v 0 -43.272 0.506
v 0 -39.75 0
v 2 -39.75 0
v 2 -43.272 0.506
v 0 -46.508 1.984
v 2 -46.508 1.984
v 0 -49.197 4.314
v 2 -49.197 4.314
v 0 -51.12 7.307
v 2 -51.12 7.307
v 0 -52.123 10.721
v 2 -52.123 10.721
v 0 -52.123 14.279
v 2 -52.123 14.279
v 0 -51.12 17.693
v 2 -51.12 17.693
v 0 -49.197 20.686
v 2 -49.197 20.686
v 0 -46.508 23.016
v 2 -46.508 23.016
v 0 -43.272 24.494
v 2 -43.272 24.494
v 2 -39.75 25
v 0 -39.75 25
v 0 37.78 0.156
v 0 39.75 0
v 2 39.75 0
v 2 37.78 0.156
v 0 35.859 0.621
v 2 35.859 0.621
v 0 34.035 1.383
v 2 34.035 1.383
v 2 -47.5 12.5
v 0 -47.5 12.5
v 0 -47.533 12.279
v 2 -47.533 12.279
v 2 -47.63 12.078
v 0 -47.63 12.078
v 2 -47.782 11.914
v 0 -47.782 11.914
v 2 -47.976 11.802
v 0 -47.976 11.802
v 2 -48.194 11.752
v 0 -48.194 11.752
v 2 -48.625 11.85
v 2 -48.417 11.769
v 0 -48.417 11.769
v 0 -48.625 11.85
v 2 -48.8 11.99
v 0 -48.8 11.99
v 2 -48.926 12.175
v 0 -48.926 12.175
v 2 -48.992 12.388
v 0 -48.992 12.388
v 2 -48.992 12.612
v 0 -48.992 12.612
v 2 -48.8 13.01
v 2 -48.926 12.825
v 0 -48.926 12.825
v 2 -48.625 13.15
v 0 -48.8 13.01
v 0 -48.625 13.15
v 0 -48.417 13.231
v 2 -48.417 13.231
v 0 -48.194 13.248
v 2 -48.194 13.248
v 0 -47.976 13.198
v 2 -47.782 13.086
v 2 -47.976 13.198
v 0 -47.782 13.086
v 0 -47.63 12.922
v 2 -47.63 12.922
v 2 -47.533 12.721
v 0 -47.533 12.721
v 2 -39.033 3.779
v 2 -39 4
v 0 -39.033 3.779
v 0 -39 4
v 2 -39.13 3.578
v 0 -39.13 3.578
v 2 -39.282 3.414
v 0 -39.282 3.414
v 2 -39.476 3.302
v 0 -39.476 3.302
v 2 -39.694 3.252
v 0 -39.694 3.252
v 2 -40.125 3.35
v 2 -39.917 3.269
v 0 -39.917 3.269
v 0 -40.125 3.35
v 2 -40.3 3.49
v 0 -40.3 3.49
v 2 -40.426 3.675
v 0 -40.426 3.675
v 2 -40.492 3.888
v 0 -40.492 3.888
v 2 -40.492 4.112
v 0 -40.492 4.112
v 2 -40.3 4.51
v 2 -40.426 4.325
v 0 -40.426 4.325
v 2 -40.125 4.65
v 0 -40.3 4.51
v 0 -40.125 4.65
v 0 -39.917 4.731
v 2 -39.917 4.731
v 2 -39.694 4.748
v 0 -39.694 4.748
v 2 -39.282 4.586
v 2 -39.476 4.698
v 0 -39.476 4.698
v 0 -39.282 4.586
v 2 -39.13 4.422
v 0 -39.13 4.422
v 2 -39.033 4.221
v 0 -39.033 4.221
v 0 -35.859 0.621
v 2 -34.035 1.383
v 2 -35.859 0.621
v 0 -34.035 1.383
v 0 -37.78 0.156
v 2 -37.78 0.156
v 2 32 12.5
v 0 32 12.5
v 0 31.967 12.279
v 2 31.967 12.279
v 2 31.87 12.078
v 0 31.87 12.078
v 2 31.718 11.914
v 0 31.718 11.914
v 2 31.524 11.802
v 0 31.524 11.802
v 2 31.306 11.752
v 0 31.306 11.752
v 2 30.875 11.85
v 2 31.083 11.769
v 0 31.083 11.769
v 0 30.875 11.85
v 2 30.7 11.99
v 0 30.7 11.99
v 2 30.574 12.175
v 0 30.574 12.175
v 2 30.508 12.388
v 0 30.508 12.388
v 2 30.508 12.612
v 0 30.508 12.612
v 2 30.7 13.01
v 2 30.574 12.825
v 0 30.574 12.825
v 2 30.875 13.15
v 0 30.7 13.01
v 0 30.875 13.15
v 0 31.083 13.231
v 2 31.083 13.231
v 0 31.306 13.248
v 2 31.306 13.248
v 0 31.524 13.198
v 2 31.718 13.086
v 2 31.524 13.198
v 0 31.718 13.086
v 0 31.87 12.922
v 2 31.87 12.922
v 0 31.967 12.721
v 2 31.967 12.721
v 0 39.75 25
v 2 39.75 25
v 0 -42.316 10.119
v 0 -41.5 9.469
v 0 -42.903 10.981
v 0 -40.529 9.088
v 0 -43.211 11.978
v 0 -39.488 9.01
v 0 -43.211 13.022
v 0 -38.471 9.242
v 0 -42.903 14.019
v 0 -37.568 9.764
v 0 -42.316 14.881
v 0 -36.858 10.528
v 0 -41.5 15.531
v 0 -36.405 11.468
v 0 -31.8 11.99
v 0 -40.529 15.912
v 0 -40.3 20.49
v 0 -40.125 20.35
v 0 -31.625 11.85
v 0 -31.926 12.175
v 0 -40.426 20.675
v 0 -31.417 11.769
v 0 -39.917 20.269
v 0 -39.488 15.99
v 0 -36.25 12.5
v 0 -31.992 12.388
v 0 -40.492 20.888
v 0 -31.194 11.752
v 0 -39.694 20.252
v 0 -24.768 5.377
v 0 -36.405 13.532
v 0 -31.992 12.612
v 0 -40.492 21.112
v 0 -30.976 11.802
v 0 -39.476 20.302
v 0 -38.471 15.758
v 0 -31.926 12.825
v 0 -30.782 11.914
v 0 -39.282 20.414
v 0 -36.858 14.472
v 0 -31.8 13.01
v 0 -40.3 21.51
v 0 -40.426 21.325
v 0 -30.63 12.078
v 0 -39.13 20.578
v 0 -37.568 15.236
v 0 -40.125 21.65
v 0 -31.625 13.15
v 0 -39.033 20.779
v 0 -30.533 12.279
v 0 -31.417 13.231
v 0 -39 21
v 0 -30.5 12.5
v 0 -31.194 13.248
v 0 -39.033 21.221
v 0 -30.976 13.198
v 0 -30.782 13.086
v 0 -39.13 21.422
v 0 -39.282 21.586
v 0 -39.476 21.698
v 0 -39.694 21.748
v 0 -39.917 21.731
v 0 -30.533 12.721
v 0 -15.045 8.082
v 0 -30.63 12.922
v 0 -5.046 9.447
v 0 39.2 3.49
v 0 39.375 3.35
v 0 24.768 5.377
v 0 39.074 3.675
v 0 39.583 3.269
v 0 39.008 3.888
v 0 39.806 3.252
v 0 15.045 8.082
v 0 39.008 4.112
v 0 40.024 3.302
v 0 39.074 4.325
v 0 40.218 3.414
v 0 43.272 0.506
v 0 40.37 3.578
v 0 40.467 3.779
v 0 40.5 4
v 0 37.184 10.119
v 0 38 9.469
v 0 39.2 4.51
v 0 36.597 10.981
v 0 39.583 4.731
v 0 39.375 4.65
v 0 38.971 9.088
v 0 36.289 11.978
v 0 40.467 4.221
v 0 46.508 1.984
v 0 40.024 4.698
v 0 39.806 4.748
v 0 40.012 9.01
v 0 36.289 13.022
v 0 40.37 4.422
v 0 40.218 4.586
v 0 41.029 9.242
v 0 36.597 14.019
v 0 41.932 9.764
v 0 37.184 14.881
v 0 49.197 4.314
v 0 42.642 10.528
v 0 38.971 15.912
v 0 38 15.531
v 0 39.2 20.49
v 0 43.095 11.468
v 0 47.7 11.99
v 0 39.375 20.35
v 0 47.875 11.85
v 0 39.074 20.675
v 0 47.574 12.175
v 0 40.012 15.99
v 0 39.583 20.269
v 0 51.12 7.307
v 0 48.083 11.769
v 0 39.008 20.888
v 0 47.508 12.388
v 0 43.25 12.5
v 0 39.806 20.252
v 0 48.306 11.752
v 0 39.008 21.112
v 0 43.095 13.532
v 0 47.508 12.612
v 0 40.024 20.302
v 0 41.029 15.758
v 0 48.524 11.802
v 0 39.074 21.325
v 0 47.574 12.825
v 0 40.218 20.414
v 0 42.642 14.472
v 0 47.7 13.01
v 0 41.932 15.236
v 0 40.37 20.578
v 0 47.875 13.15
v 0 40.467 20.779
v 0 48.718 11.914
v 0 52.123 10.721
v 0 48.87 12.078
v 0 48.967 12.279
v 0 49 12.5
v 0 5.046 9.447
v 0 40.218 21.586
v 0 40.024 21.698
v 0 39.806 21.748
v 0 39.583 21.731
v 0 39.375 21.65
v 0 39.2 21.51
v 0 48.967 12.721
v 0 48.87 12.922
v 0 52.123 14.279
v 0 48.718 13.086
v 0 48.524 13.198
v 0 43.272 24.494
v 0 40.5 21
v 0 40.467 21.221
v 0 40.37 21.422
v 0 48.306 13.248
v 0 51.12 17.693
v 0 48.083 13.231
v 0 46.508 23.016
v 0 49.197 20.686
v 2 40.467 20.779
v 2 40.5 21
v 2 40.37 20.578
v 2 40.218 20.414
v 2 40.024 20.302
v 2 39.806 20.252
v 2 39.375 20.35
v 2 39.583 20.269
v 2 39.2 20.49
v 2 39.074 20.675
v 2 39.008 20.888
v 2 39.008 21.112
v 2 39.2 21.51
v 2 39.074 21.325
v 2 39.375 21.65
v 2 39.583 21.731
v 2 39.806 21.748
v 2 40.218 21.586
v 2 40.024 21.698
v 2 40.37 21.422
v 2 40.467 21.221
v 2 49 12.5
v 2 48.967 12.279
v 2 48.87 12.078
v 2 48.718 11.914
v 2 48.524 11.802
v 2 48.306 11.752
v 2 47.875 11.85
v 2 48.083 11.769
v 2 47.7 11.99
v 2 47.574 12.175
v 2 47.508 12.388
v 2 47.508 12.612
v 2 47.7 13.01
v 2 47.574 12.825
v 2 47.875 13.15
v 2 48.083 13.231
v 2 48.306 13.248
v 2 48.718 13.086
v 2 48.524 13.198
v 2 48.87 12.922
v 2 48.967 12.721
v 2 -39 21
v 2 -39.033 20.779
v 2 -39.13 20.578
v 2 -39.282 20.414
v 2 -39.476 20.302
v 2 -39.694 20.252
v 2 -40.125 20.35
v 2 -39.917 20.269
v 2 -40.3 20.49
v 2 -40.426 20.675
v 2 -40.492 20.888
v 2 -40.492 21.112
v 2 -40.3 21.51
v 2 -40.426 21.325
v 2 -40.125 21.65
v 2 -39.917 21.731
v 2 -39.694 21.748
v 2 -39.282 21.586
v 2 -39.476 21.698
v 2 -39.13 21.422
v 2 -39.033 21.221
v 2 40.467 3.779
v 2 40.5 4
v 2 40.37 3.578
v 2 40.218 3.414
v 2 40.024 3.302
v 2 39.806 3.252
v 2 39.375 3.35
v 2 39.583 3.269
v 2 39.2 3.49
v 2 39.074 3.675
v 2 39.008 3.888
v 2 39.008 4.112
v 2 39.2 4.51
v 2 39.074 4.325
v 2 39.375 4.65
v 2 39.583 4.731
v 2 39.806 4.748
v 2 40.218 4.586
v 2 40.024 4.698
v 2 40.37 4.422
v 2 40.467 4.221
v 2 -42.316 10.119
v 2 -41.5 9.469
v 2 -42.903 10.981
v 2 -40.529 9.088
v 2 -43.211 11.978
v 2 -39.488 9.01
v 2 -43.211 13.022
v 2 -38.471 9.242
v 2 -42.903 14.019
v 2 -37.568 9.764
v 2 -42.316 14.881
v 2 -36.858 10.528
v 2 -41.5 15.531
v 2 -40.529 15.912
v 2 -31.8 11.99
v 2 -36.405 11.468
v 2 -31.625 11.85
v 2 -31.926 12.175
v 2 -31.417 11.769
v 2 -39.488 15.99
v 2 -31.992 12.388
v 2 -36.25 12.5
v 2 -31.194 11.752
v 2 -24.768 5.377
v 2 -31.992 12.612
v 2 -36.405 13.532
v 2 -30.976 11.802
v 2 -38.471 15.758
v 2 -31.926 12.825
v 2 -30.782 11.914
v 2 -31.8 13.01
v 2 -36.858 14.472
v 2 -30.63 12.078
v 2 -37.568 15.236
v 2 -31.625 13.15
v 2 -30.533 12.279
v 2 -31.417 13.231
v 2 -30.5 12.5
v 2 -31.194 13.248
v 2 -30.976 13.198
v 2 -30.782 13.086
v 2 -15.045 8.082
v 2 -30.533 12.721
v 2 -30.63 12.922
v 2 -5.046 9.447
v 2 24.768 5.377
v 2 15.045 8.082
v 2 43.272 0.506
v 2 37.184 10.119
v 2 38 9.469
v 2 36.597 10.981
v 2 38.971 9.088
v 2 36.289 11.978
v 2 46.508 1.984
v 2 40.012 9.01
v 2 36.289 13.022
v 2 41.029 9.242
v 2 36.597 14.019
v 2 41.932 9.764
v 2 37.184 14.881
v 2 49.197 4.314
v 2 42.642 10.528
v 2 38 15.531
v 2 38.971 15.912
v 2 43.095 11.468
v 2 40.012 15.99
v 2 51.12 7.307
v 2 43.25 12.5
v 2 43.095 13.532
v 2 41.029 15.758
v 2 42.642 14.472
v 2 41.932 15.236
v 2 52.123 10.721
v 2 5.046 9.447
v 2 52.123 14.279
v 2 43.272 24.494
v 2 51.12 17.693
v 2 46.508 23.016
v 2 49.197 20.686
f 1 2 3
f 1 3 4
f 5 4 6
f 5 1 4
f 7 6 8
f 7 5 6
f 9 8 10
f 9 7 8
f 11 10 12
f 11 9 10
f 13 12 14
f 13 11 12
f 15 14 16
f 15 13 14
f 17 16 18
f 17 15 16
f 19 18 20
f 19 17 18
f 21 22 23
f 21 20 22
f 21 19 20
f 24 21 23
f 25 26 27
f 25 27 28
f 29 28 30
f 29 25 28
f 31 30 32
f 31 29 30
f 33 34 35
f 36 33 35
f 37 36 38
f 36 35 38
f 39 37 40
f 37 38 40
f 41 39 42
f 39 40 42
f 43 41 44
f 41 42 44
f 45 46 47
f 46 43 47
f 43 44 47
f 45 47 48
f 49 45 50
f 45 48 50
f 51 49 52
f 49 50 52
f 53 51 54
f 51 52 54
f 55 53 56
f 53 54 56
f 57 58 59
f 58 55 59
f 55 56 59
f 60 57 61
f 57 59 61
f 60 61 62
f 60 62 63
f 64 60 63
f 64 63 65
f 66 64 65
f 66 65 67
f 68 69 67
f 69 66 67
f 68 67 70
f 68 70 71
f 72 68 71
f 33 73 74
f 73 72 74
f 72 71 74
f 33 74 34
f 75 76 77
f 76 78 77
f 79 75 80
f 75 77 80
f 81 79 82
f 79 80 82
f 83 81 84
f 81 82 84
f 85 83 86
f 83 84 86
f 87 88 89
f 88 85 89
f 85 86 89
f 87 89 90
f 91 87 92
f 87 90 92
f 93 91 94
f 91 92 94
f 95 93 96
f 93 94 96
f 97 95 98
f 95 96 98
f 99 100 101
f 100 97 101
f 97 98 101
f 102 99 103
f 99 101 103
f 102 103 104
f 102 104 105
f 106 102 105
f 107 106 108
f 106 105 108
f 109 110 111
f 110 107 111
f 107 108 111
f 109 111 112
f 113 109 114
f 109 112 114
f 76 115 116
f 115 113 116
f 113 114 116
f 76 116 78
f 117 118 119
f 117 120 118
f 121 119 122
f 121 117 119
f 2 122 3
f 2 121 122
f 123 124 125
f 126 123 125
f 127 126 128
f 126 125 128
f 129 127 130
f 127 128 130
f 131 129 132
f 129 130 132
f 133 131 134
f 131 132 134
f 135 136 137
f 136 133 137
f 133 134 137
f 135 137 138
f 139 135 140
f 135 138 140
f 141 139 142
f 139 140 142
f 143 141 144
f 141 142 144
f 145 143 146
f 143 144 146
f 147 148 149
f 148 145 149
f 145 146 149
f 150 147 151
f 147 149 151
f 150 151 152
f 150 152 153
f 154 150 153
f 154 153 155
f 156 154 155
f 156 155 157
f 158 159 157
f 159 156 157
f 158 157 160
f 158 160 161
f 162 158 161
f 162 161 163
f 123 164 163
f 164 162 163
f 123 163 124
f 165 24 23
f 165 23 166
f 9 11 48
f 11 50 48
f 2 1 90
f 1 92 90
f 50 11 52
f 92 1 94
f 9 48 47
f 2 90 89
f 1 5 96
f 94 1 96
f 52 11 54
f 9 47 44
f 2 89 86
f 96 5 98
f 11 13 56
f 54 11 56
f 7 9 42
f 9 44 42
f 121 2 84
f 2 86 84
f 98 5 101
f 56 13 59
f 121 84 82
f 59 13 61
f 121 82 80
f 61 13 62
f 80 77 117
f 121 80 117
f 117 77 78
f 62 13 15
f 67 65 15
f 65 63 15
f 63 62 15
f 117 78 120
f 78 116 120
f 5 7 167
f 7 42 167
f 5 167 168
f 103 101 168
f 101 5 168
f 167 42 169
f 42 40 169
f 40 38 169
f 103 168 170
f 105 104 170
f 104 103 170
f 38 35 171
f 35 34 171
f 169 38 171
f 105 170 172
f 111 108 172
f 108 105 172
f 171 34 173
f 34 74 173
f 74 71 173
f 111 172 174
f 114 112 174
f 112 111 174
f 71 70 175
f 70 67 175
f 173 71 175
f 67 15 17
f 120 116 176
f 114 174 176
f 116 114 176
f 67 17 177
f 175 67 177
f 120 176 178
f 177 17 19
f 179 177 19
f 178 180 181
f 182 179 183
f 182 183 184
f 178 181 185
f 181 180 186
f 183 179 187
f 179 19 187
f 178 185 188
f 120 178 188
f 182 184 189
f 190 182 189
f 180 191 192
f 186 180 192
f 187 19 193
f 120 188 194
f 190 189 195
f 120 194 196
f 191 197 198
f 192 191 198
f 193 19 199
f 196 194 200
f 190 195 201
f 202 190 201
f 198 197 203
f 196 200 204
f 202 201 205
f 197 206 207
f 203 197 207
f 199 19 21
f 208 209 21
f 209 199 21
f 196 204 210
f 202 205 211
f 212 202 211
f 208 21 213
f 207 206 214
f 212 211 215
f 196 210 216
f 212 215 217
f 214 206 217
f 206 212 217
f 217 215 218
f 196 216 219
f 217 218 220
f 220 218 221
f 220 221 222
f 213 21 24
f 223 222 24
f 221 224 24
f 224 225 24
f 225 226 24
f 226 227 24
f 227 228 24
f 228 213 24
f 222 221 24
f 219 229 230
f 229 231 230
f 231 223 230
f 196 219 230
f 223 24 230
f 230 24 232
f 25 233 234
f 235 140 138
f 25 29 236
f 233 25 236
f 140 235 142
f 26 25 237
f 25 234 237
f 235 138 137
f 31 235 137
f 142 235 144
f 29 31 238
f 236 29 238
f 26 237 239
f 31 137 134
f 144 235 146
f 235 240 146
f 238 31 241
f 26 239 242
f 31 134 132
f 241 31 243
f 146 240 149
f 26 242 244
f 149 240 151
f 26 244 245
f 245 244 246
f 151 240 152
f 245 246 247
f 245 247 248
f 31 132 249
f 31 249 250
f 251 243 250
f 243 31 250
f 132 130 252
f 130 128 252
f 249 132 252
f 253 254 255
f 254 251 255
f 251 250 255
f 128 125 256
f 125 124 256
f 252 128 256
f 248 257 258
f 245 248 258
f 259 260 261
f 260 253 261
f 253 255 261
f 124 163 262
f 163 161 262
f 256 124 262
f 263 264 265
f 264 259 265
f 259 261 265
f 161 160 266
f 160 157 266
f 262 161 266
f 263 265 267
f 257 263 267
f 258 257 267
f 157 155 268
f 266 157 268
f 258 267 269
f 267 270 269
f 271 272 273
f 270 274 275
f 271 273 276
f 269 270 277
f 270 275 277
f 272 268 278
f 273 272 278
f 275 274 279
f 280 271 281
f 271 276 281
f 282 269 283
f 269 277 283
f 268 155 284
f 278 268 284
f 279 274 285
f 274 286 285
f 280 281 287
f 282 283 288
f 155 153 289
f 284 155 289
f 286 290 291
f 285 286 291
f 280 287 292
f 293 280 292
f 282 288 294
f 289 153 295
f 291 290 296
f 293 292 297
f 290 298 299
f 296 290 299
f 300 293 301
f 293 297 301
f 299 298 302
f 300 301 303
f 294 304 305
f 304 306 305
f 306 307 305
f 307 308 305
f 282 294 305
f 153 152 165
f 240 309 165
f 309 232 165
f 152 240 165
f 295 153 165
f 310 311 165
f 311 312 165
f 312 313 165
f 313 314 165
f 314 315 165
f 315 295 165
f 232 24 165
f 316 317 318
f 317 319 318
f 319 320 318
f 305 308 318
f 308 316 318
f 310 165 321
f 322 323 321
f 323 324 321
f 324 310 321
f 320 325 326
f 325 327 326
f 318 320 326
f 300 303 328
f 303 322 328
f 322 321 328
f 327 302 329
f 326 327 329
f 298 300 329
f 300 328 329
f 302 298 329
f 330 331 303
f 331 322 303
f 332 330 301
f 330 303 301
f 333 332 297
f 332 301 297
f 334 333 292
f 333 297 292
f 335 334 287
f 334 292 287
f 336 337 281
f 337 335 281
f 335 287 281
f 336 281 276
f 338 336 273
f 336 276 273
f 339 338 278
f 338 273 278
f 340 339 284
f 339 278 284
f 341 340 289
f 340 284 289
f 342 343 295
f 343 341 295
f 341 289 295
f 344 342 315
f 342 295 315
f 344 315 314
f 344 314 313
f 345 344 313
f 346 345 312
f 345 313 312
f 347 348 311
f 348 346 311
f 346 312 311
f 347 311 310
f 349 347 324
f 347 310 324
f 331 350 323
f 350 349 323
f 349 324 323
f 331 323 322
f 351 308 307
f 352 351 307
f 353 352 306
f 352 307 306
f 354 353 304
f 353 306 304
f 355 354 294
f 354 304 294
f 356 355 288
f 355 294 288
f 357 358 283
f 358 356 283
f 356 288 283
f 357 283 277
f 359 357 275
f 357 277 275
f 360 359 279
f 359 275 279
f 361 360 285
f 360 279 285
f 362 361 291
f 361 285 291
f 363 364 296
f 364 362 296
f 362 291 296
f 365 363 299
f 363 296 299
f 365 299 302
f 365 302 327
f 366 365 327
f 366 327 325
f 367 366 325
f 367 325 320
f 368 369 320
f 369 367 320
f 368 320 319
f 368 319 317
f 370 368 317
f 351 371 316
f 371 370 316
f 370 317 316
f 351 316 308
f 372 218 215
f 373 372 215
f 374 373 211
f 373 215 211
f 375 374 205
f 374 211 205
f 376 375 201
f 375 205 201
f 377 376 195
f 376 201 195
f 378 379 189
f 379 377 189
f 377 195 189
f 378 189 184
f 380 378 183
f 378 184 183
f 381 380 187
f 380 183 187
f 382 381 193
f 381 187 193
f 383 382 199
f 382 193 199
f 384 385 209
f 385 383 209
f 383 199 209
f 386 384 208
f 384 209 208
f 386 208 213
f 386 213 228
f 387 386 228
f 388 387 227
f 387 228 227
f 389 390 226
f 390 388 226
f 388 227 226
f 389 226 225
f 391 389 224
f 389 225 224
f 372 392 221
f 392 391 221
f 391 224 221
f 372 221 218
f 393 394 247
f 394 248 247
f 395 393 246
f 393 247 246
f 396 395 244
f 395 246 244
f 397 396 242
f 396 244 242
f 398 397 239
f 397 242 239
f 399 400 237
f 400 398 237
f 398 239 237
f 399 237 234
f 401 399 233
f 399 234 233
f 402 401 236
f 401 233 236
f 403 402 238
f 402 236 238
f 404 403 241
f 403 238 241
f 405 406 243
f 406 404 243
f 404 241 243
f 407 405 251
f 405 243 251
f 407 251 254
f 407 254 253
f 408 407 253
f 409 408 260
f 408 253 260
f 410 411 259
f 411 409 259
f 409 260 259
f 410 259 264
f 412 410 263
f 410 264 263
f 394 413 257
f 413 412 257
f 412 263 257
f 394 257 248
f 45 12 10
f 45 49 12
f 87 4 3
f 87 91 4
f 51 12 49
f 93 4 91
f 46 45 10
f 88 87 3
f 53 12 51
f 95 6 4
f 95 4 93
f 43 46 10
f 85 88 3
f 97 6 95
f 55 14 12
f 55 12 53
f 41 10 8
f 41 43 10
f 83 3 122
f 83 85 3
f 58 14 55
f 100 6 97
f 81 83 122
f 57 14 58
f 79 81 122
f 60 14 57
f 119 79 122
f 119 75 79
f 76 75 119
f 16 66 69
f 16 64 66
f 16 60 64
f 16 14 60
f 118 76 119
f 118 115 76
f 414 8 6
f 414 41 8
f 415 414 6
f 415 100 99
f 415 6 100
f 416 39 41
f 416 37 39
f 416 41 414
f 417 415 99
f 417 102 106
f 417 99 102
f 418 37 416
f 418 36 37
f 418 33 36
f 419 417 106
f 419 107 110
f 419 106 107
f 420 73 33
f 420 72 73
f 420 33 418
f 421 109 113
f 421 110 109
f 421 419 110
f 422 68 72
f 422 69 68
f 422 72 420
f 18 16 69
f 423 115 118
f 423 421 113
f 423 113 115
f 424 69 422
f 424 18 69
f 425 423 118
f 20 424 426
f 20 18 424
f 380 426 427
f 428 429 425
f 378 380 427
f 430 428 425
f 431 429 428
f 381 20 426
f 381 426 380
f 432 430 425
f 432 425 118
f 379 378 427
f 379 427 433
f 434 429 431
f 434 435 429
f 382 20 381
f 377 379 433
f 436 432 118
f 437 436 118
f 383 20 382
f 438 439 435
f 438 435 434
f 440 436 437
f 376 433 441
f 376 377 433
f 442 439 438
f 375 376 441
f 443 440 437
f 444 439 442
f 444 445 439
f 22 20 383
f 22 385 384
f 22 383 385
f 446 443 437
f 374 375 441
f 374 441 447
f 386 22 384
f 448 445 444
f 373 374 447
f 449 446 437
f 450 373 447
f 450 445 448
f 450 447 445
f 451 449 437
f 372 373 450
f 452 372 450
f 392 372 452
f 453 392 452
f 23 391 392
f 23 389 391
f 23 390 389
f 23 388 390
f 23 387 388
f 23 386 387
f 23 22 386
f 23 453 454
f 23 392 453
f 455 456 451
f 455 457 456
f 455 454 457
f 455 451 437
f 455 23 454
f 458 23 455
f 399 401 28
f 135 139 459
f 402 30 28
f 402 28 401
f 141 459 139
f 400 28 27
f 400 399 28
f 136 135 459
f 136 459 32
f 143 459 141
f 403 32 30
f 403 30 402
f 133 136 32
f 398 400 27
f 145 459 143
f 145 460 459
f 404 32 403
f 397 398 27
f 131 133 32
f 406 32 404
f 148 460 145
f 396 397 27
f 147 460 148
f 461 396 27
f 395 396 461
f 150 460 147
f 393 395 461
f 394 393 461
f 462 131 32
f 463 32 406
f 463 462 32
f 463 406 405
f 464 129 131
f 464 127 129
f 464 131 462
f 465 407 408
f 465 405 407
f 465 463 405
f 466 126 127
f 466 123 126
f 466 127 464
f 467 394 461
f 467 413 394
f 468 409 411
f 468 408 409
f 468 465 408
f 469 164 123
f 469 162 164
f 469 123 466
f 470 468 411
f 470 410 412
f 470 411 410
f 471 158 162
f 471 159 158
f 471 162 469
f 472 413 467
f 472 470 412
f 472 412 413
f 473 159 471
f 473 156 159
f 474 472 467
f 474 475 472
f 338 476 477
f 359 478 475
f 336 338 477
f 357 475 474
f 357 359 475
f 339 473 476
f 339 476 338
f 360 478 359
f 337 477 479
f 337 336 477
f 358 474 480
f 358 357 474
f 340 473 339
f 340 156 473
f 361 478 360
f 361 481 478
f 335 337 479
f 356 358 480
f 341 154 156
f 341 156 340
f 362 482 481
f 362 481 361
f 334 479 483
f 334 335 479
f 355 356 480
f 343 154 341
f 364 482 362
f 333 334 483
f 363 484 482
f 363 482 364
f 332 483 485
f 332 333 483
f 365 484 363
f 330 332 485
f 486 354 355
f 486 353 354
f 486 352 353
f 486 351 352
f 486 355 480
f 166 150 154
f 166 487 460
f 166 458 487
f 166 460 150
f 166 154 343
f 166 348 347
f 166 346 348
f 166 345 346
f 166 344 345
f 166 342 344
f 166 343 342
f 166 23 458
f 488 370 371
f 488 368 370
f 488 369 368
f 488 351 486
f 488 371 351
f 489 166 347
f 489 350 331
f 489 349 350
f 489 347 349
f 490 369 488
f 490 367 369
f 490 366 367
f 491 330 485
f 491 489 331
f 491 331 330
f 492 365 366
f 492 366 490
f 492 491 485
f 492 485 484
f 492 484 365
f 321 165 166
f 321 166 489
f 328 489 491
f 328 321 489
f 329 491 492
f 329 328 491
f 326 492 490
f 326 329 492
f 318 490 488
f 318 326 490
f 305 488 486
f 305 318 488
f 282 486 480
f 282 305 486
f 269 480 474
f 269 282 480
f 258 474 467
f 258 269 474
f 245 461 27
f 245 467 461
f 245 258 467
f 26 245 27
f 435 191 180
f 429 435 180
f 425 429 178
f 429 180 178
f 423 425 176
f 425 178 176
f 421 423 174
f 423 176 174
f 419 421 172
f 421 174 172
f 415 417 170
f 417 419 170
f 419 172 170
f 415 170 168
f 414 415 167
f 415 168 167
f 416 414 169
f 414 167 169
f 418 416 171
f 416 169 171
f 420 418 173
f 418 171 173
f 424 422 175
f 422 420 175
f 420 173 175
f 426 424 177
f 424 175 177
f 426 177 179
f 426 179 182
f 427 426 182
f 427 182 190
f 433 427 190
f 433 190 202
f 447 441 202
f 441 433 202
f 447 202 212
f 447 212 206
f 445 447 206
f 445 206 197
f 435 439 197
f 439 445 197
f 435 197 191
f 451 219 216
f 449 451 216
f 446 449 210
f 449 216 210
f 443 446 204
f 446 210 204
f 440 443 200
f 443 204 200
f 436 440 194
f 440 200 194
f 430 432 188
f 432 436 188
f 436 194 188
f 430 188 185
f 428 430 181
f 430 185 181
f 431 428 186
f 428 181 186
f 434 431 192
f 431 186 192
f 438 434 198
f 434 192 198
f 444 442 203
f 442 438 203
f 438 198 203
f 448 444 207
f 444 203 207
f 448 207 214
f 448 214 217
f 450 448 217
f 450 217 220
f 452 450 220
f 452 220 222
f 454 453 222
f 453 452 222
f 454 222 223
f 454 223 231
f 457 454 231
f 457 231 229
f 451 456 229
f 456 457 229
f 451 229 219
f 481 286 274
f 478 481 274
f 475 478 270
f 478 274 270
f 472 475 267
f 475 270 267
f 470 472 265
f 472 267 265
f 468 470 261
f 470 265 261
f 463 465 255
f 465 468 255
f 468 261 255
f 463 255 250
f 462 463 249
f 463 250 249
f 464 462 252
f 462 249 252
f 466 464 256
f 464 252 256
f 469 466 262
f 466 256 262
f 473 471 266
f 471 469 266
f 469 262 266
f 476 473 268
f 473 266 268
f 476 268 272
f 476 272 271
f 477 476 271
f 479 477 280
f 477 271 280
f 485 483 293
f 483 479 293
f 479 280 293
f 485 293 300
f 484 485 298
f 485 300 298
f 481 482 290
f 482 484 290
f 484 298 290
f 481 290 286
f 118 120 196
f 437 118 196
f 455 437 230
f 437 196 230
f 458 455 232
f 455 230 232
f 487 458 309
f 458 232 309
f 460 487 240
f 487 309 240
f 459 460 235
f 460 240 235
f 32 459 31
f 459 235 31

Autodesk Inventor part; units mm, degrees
ref_plane "YZ Plane" through (0, 0, 0) normal (1, 0, 0) x (0, 1, 0)
ref_plane "XZ Plane" through (0, 0, 0) normal (0, 1, 0) x (-1, 0, 0)
ref_plane "XY Plane" through (0, 0, 0) normal (0, 0, 1) x (1, 0, 0)
sketch "Sketch1" plane through (0, 0, 0) normal (1, 0, 0) x (0, 1, 0)
  line L0 (-39.75, 25) -> (39.75, 25)
  arc A0 (-39.75, 25) -> (-39.75, 0) centre (-39.75, 12.5) ccw
  arc A1 (39.75, 0) -> (39.75, 25) centre (39.75, 12.5) ccw
  circle A2 centre (39.75, 12.5) radius 3.5
  circle A3 centre (39.75, 21) radius 0.75
  circle A4 centre (48.25, 12.5) radius 0.75
  circle A5 centre (39.75, 4) radius 0.75
  circle A6 centre (31.25, 12.5) radius 0.75
  circle A7 centre (-39.75, 12.5) radius 3.5
  circle A8 centre (-48.25, 12.5) radius 0.75
  circle A9 centre (-39.75, 21) radius 0.75
  circle A10 centre (-31.25, 12.5) radius 0.75
  circle A11 centre (-39.75, 4) radius 0.75
  arc A12 (34.0354, 1.3827) -> (-34.0354, 1.3827) centre (0, -64.8302) ccw
  arc A13 (-39.75, 0) -> (-34.0354, 1.3827) centre (-39.75, 12.5) ccw
  arc A14 (34.0354, 1.3827) -> (39.75, 0) centre (39.75, 12.5) ccw
  point P0 (0, 0)
  point P1 (0, 0)
  dimension "d0" = 79.5
  dimension "d1" = 25
  dimension "d2" = 25
  dimension "d3" = 7
  dimension "d4" = 1.5
  dimension "d5" = 1.5
  dimension "d6" = 1.5
  dimension "d7" = 8.5
  dimension "d8" = 8.5
  dimension "d9" = 8.5
  dimension "d10" = 1.5
  dimension "d11" = 8.5
  dimension "d12" = 7
  dimension "d13" = 1.5
  dimension "d14" = 1.5
  dimension "d15" = 1.5
  dimension "d16" = 1.5
  dimension "d17" = 8.5
  dimension "d18" = 8.5
  dimension "d19" = 8.5
  dimension "d20" = 8.5
extrude "Extrusion1" add sketch "Sketch1" along normal blind 2
properties part number "tibia extrude"
